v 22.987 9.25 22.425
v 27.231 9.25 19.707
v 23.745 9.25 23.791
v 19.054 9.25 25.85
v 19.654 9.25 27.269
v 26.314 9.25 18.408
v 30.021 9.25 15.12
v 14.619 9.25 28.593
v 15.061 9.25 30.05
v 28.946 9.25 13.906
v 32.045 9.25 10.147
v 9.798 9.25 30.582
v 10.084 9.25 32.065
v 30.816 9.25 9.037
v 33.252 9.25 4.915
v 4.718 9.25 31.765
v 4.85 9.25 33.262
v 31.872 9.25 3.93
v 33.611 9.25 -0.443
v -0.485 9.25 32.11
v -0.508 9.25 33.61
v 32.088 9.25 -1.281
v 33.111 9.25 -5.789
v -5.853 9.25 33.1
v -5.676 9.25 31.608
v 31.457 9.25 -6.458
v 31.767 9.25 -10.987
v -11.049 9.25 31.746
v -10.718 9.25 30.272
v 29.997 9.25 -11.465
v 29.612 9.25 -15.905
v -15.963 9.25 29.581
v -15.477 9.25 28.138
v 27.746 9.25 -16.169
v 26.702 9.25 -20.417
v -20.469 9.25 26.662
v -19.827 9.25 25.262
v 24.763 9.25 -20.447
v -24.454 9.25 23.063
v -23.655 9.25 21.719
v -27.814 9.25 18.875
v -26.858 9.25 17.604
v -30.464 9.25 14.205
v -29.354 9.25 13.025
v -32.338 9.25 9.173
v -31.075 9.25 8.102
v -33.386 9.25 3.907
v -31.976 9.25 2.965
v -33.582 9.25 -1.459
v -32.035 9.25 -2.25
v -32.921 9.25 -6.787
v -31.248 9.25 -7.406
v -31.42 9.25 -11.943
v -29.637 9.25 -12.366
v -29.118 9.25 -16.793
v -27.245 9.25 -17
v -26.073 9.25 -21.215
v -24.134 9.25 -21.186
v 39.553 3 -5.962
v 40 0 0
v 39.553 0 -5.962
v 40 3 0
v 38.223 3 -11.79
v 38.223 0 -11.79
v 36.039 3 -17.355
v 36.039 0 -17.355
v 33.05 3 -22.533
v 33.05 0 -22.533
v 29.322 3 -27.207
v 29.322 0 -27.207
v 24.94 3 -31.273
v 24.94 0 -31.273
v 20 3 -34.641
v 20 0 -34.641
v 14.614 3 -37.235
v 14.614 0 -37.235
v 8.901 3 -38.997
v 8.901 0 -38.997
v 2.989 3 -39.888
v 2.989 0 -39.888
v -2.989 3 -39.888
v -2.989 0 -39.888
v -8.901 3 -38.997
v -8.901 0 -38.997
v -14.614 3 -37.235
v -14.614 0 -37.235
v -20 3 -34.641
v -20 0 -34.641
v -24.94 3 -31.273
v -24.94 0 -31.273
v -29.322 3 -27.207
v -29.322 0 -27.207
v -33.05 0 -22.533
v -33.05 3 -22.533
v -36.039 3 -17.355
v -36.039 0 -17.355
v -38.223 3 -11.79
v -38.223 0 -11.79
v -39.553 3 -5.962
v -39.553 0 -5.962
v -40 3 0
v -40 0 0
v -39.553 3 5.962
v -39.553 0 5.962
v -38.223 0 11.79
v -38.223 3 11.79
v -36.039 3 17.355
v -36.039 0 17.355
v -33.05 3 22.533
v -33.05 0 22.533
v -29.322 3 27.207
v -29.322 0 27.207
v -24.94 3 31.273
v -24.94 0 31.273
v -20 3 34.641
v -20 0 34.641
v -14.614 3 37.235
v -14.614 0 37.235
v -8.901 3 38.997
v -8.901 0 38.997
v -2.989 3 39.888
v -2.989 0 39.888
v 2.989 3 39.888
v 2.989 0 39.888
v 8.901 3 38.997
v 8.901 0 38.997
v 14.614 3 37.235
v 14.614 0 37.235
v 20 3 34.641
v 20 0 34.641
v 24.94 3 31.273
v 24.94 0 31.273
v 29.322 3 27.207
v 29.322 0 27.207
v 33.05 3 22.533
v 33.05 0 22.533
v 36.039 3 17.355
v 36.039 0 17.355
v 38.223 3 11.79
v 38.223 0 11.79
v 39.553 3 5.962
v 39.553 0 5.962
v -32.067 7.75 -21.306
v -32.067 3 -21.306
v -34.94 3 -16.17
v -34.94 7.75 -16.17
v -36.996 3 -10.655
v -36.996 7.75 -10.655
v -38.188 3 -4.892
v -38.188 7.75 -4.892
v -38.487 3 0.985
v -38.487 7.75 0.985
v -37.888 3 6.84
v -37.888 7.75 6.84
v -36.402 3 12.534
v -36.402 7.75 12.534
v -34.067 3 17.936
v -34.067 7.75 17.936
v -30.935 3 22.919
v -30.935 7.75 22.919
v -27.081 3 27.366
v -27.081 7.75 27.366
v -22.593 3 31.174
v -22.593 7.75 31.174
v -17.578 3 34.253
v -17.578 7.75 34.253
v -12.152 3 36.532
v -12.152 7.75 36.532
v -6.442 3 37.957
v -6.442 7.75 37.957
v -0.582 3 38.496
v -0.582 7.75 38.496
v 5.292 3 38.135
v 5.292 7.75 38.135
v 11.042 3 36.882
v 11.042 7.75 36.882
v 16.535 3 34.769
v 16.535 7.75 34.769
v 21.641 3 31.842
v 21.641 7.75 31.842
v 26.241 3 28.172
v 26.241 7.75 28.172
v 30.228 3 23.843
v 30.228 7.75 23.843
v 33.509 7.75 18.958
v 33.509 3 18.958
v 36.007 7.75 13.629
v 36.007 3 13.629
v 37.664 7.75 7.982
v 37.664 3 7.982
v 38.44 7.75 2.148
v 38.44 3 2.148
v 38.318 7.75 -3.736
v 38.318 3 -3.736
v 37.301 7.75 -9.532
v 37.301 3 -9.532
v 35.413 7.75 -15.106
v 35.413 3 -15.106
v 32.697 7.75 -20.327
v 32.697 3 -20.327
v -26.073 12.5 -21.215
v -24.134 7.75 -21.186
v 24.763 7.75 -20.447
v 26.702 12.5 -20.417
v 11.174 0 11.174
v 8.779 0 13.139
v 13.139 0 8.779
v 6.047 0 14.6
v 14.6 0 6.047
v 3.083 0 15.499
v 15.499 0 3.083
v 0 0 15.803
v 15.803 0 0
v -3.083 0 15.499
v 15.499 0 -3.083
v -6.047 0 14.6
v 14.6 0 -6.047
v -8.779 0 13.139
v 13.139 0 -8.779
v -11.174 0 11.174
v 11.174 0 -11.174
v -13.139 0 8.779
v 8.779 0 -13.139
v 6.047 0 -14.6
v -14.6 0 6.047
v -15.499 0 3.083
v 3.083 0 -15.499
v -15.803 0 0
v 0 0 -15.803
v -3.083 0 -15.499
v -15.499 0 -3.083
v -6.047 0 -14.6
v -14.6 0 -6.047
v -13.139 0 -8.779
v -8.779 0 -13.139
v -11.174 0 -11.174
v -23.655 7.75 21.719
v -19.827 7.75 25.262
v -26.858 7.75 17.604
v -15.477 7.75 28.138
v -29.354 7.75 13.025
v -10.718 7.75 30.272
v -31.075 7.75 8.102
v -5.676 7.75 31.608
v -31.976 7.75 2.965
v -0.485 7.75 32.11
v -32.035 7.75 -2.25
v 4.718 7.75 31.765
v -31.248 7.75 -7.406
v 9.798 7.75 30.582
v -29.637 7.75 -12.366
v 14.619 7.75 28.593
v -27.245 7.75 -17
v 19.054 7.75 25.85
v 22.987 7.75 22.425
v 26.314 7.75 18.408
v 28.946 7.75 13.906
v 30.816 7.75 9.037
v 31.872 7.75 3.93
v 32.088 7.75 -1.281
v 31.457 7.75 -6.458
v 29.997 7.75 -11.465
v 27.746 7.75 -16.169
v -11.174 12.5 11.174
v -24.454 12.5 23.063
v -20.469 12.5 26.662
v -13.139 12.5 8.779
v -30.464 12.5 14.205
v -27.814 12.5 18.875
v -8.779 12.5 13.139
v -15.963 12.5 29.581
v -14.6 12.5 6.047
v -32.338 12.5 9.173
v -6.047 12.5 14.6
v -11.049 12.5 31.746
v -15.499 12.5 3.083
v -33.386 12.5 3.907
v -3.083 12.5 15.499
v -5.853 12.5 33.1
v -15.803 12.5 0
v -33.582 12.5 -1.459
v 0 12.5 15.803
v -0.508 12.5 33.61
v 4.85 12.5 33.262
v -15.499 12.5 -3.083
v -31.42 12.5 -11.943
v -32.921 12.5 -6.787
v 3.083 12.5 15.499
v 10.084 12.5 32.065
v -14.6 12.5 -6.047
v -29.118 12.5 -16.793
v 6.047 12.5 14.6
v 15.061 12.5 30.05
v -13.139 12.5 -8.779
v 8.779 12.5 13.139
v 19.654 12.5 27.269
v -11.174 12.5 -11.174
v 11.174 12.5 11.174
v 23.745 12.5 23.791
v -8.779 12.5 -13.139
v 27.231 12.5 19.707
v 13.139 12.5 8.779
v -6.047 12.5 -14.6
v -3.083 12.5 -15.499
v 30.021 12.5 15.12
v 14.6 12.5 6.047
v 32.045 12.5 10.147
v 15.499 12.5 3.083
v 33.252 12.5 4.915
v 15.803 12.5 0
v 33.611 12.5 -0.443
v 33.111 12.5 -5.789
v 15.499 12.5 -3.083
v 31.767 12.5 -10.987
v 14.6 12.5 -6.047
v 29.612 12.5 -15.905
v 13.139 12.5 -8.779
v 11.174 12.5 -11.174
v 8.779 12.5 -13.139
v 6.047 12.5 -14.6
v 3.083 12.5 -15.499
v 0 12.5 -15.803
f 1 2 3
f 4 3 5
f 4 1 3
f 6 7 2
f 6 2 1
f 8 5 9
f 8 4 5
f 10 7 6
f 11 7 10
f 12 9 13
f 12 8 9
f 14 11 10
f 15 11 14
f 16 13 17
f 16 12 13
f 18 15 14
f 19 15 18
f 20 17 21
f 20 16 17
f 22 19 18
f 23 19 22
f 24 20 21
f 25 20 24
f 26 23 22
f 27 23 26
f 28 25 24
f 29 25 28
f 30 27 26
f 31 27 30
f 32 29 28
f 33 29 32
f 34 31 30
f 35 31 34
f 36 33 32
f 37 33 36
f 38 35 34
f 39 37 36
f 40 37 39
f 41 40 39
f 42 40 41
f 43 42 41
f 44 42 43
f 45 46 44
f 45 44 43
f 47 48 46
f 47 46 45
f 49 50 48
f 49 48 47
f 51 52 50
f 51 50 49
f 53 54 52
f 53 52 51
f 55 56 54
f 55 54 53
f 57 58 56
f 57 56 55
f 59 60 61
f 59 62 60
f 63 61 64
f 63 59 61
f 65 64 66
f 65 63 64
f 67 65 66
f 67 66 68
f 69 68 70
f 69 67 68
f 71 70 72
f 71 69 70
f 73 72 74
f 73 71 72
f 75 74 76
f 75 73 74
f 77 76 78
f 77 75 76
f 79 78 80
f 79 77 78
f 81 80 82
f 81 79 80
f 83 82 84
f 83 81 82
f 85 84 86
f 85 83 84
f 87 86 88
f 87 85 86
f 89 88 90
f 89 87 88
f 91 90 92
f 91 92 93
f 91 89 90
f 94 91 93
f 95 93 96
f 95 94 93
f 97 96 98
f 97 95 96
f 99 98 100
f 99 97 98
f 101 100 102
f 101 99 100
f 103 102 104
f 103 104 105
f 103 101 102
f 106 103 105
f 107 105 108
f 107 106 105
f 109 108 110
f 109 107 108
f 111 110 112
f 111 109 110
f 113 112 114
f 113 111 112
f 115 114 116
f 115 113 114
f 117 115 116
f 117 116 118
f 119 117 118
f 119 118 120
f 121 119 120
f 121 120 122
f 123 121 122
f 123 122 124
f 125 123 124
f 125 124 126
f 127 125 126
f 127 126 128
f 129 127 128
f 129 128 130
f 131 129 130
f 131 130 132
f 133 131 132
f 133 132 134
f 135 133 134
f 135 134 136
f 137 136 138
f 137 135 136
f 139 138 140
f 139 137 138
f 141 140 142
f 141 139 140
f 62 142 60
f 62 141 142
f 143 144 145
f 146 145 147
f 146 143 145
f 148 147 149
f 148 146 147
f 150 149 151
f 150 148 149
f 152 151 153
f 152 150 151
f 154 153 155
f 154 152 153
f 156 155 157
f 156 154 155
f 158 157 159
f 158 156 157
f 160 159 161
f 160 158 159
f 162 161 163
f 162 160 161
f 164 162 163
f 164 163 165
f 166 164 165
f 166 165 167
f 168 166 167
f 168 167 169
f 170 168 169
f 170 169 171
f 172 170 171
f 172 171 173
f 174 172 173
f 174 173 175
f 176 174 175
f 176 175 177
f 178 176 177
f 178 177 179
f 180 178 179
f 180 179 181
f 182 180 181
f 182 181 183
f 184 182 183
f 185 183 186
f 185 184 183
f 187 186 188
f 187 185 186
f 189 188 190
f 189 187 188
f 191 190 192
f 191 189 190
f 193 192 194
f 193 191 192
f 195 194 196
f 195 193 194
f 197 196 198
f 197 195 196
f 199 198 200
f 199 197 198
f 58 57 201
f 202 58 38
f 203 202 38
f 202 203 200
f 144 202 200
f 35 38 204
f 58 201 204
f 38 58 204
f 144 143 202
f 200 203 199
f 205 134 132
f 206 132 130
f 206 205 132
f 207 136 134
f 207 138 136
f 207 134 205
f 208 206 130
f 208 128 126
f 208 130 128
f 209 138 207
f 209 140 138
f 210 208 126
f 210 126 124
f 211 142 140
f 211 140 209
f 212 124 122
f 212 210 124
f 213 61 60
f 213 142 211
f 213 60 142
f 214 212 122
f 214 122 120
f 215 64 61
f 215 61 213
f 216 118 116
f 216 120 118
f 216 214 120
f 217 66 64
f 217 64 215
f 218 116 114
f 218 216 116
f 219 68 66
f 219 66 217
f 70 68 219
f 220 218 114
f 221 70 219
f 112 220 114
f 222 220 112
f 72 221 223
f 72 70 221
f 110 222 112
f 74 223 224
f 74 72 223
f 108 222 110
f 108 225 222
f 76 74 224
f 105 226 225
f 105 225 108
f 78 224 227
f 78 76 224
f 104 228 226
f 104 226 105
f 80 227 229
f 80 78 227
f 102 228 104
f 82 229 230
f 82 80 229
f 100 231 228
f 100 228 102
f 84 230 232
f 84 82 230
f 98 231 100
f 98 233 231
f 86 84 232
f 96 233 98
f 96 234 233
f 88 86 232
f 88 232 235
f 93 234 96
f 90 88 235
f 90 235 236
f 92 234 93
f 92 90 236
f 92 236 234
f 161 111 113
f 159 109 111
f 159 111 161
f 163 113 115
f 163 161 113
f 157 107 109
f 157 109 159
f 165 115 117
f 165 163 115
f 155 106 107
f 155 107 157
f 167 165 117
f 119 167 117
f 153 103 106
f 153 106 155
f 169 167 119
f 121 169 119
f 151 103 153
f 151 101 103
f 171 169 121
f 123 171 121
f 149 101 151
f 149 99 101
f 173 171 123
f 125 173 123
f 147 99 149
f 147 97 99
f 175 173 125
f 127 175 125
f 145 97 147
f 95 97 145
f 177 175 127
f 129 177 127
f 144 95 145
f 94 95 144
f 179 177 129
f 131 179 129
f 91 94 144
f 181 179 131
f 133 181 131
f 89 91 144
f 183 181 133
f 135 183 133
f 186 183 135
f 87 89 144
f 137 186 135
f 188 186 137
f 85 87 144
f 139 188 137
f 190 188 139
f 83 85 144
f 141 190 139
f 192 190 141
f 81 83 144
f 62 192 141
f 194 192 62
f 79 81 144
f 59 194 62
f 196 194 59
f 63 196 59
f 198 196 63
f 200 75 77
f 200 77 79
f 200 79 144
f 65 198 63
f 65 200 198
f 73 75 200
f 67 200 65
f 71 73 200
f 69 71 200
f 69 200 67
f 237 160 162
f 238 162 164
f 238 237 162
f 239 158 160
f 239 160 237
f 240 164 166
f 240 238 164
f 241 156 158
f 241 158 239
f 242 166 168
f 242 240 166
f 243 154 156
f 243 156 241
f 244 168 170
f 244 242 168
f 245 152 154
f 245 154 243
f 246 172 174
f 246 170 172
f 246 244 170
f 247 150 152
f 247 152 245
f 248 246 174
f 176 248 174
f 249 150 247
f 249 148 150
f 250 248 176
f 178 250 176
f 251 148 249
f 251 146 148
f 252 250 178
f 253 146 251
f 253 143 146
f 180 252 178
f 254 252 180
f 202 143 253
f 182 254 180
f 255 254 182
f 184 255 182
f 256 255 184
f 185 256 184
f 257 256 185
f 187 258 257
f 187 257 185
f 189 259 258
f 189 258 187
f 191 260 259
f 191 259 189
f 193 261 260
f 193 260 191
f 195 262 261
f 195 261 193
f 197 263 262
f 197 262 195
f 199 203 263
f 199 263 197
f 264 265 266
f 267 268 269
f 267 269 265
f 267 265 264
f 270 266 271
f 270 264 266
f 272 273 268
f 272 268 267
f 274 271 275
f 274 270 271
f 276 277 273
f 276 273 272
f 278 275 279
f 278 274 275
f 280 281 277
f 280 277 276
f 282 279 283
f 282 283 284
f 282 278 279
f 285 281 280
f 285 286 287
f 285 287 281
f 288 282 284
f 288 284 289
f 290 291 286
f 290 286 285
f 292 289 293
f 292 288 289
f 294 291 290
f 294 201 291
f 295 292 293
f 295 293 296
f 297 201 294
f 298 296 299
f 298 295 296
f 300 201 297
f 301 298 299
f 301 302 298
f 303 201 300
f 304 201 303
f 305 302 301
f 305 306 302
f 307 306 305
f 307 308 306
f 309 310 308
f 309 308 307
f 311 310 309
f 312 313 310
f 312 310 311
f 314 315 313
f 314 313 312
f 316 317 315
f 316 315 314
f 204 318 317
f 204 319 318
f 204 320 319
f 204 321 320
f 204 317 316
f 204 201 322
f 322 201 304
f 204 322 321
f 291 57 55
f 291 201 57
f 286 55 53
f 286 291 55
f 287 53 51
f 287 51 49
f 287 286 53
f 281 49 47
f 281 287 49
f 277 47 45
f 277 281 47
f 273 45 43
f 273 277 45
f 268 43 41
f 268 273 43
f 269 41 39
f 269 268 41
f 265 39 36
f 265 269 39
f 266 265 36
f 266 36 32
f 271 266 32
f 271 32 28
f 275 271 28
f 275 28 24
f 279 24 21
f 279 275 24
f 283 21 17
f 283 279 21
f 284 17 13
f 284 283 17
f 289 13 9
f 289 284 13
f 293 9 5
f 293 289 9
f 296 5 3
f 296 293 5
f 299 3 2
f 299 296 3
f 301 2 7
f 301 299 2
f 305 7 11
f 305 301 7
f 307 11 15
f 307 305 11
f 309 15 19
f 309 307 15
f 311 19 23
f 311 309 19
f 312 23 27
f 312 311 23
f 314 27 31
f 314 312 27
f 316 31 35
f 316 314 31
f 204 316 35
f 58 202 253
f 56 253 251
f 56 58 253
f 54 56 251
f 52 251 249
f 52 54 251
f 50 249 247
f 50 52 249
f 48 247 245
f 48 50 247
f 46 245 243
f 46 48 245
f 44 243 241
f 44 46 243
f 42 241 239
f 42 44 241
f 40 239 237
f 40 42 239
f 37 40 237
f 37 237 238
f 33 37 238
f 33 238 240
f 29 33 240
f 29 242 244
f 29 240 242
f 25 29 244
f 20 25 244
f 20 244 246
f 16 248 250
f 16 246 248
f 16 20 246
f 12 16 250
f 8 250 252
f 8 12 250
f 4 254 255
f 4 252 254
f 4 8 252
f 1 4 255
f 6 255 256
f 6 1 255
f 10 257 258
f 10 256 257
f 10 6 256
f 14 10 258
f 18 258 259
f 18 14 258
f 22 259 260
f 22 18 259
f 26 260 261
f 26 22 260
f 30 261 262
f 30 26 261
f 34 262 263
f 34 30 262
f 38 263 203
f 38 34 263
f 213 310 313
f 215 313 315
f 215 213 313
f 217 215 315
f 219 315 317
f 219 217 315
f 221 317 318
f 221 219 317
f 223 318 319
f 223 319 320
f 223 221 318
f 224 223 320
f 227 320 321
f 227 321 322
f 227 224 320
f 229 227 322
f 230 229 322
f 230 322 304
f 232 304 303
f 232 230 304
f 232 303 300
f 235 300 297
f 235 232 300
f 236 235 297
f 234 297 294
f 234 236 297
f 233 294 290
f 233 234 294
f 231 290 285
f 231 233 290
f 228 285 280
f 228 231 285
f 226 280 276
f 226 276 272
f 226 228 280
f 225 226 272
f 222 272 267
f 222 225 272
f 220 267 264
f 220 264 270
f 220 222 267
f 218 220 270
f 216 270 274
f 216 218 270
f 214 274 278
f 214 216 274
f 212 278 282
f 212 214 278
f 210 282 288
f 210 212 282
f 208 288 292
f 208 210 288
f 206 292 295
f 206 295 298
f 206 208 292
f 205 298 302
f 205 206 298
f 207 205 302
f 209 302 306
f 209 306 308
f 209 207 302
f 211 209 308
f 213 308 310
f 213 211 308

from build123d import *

# Parameters (mm, degrees)
CUT_EXTRUDE1_DEPTH = 9.5


with BuildPart() as part:
    # Sketch1 → Revolve1 (revolve)
    with BuildSketch(Plane.XY):
        Polygon((15.802589648, 0), (40, 0), (40, 3), (38.5, 3), (38.5, 7.75), (32.113475553, 7.75), (32.113475553, 9.25), (33.613475553, 9.25), (33.613475553, 12.5), (15.802589648, 12.5), align=None)
    revolve(axis=Axis((0, 0, 0), (0, 1, 0)))

    # Sketch2 → Cut-Extrude1 (cut)
    with BuildSketch(Plane(origin=(0, 12.5, 0), x_dir=(1, 0, 0), z_dir=(0, 1, 0))):
        with BuildLine():
            Line((-32.06723123, 21.305930659), (32.696608404, 20.326873809))
            ThreePointArc((32.696608404, 20.326873809), (0.581951017, 38.495601476), (-32.06723123, 21.305930659))
        make_face()
    extrude(amount=-CUT_EXTRUDE1_DEPTH, mode=Mode.SUBTRACT)


solid = part.part
